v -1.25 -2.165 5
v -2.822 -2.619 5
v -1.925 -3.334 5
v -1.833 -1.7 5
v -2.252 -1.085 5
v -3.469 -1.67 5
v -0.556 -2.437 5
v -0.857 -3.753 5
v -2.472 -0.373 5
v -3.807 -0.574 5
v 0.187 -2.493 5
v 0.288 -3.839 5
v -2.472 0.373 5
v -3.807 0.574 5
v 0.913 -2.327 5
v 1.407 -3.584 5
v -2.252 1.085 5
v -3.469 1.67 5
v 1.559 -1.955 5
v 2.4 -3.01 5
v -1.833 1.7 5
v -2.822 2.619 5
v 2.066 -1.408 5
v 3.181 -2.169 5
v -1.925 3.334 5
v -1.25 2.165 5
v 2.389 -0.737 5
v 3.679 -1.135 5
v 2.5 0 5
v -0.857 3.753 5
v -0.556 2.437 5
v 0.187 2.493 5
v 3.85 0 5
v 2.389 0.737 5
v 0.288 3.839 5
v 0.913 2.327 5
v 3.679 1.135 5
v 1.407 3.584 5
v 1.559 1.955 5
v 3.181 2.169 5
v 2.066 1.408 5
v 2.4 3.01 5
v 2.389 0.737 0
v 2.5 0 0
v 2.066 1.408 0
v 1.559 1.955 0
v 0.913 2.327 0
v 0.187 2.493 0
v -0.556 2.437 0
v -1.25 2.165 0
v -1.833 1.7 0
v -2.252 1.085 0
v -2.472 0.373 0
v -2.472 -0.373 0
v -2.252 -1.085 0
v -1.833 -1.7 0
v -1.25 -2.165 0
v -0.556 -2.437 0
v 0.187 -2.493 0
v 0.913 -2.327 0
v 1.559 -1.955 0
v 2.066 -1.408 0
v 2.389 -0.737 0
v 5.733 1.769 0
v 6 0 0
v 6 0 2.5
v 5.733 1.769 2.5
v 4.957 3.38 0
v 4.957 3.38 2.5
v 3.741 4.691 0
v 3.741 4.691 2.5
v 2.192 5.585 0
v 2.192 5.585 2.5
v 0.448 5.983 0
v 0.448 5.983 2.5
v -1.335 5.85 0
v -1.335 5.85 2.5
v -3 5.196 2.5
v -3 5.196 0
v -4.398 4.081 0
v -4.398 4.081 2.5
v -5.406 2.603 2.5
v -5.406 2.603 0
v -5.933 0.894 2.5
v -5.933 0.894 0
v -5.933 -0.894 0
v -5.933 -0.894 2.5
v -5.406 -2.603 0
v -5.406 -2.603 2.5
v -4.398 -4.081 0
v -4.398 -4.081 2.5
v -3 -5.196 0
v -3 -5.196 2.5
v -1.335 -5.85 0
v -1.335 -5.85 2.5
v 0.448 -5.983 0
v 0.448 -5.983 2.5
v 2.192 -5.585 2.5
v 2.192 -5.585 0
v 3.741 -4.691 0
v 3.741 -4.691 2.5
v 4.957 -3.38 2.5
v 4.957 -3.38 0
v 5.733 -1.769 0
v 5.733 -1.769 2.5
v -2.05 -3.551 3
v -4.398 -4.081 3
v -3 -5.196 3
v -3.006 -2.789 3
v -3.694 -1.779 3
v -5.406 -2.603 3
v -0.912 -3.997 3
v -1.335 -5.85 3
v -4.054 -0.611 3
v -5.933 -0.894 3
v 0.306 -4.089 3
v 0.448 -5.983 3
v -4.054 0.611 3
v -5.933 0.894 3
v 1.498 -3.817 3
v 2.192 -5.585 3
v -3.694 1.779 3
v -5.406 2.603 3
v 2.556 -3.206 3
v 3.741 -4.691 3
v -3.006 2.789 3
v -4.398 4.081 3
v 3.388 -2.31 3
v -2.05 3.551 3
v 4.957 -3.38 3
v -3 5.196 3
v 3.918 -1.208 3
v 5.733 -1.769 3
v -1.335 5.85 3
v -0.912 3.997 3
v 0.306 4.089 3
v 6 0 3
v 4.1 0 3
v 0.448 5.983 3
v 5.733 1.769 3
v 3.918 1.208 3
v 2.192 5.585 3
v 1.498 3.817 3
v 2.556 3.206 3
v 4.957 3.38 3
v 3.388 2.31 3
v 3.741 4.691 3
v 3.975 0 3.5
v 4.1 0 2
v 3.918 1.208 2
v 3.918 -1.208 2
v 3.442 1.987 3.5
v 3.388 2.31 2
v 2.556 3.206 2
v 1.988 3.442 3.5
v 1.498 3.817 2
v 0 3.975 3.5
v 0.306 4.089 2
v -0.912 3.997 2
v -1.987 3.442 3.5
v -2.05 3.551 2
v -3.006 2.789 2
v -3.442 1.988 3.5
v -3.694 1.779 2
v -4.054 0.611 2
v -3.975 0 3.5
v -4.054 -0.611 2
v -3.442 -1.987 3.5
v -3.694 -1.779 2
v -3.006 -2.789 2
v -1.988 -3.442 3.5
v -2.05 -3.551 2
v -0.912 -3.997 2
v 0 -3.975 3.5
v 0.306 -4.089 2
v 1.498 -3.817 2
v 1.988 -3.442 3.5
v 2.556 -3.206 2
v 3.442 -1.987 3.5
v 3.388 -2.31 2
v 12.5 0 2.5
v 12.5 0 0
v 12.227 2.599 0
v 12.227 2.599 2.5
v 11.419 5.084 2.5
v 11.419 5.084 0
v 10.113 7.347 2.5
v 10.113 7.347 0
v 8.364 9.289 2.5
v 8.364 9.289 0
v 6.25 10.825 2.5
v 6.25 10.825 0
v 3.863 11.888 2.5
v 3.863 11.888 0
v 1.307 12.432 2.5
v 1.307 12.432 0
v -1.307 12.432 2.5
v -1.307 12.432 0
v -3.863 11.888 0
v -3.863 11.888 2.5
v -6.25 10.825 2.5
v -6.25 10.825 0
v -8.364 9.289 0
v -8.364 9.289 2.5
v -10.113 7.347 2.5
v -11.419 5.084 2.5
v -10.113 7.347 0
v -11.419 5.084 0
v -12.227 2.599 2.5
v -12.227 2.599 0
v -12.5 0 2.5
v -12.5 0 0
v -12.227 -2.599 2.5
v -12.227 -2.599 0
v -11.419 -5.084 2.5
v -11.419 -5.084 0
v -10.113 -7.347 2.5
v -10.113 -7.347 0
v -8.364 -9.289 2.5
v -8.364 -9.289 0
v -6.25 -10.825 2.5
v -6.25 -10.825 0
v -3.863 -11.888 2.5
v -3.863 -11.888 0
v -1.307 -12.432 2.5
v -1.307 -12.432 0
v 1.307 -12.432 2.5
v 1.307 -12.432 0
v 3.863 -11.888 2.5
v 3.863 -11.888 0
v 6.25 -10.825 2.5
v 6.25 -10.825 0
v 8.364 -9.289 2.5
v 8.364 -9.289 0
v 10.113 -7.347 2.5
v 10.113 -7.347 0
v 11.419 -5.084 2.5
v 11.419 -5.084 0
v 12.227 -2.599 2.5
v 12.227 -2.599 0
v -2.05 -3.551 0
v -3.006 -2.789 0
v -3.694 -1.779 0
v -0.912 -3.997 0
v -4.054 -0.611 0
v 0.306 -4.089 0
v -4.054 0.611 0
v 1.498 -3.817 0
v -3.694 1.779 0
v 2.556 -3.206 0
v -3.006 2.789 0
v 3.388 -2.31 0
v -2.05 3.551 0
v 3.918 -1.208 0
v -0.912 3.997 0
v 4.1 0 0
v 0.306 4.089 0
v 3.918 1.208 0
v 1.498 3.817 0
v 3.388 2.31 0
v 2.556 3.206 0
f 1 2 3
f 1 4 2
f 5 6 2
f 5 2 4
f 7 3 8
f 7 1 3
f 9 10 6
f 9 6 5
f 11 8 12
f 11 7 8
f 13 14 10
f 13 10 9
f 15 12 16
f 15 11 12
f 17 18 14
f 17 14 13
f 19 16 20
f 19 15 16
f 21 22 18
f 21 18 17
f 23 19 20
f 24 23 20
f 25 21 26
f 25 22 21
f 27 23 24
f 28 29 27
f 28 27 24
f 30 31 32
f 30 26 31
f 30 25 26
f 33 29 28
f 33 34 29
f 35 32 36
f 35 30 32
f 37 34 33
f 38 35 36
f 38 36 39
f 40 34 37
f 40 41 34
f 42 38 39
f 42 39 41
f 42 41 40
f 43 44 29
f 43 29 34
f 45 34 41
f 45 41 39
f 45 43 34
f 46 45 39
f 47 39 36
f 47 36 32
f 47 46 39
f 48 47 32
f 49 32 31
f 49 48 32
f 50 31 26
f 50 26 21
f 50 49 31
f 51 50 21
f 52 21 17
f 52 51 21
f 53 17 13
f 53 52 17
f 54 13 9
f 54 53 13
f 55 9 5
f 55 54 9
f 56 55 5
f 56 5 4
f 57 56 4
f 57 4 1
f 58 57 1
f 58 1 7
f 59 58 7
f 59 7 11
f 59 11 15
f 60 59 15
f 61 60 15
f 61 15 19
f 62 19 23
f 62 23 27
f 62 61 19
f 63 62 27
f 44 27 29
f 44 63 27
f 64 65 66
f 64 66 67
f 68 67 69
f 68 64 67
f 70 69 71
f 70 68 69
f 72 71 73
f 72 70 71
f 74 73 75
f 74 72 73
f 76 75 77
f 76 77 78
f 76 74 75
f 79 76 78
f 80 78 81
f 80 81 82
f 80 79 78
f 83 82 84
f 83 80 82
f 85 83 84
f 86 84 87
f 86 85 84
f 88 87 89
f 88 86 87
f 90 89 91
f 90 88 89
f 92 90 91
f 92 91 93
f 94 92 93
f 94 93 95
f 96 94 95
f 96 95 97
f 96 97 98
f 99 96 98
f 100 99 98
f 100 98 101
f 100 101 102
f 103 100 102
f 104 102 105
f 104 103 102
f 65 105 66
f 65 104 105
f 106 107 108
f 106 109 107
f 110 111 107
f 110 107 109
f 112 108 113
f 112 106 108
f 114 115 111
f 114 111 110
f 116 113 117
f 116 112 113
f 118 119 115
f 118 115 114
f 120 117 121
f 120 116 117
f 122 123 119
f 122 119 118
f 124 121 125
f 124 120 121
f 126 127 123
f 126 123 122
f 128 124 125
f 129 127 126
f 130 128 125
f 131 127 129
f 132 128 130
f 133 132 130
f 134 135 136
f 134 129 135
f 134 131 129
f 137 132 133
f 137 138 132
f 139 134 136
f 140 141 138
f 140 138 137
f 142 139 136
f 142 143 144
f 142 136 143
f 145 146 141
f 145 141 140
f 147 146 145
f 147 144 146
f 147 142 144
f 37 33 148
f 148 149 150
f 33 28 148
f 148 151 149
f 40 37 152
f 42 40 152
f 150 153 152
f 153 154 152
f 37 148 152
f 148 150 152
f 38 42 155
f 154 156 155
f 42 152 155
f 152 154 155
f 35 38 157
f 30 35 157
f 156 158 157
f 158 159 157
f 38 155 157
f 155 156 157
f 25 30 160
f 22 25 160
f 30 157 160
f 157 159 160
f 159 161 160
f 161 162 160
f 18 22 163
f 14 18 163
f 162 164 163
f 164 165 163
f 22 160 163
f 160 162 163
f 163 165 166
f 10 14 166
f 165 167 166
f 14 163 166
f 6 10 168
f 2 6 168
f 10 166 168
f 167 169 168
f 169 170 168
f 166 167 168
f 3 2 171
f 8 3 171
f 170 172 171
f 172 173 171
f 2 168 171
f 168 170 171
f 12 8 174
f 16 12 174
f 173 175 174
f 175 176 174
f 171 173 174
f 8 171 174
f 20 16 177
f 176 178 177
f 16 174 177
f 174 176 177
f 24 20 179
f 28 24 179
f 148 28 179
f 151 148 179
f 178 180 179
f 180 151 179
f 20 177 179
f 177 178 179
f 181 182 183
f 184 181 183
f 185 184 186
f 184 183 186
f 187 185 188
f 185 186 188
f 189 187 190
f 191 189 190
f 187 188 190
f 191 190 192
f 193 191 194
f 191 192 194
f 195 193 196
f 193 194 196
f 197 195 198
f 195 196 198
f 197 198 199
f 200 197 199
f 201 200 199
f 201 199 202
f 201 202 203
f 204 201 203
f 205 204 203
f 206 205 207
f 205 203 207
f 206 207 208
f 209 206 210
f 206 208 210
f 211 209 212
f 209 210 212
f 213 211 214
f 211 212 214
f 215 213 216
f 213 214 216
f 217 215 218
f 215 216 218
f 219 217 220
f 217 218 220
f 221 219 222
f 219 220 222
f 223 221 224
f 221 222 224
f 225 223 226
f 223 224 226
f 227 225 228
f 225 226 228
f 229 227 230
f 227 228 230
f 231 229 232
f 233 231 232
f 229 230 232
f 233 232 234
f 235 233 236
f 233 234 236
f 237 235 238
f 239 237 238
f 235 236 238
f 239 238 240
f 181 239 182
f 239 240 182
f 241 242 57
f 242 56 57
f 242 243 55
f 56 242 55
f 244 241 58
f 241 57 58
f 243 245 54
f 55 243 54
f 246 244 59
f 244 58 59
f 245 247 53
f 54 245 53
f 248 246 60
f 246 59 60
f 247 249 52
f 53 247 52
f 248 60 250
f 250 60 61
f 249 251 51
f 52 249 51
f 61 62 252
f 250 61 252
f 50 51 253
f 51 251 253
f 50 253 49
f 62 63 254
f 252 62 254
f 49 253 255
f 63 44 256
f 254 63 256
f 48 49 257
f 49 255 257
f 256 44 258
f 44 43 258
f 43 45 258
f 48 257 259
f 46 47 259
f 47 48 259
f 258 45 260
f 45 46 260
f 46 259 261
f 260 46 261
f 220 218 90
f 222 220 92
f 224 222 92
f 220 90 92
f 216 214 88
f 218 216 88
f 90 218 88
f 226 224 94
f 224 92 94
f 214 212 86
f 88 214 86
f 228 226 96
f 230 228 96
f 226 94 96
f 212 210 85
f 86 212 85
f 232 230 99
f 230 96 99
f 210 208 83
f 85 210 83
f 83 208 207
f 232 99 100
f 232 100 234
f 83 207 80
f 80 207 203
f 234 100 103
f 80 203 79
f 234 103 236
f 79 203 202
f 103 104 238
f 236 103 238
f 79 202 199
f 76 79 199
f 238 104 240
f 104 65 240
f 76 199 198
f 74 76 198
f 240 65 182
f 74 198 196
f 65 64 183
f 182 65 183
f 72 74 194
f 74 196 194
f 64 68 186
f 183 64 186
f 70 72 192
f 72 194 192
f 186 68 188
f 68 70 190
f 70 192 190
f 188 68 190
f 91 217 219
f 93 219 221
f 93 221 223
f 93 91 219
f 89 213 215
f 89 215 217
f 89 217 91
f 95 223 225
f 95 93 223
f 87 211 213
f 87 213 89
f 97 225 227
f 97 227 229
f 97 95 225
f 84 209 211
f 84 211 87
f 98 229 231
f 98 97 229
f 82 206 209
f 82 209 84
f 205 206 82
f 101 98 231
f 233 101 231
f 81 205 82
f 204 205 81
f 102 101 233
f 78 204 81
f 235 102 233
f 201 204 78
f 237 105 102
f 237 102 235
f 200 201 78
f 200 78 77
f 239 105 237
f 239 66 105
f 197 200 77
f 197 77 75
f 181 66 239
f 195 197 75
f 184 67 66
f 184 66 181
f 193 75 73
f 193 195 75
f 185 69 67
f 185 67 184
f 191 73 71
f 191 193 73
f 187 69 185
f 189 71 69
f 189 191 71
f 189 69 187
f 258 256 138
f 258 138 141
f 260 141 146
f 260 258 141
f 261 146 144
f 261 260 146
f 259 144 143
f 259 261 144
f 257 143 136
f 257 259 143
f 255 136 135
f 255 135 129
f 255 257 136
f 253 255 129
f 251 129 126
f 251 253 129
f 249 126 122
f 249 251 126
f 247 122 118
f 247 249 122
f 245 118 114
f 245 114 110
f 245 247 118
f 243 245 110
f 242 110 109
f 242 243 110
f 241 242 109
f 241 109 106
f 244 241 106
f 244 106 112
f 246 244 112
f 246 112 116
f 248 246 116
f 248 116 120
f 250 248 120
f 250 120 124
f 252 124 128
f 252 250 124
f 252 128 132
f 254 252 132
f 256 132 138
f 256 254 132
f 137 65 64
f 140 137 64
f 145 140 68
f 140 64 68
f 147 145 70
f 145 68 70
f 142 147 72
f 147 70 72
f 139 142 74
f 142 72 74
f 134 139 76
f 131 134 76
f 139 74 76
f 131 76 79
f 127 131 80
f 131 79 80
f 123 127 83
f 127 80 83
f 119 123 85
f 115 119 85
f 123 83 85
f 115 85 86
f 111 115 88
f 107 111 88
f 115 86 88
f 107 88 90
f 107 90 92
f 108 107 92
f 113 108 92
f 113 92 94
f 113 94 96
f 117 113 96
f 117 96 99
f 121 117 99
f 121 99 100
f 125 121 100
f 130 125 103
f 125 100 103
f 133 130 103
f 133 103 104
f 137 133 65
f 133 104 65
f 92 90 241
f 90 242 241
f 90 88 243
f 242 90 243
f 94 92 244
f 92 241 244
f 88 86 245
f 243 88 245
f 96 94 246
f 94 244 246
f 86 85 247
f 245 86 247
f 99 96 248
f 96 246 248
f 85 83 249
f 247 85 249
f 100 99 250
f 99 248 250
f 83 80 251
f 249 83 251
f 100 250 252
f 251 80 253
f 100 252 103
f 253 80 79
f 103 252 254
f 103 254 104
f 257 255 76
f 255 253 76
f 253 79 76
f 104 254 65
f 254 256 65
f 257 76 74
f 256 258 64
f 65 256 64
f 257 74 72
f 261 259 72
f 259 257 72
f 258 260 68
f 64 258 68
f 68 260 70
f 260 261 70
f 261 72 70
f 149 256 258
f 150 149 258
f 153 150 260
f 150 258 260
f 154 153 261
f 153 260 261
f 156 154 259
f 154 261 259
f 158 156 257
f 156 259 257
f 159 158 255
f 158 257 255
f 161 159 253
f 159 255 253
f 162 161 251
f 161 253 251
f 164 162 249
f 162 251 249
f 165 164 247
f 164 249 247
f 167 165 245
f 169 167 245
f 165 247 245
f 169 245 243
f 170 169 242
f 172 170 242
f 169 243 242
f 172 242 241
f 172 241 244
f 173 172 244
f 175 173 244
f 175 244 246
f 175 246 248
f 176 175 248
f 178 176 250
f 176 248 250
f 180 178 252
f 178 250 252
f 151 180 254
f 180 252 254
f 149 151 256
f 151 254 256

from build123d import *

# Parameters (mm, degrees)
F0_R     = 4.1
F0_R_2   = 2.5
F1_DEPTH = 5
F0_R_3   = 12.5
F0_R_4   = 6
F2_DEPTH = 2.5
F3_DEPTH = 3
F4_SIZE2 = 3
F4_SIZE  = 0.25


with BuildPart() as f1:
    # F0 (on Top) → F1 (new body)
    with BuildSketch(Plane.XY):
        Circle(F0_R)
        Circle(F0_R_2, mode=Mode.SUBTRACT)
    extrude(amount=F1_DEPTH)

    # F4
    f4_edges = [f1.edges().sort_by_distance(p)[0] for p in [
        (-4.1, 0, 5),
    ]]
    f4_side = f1.faces().sort_by_distance((-3.984034, 0, 5))[0]
    chamfer(f4_edges, length=F4_SIZE, length2=F4_SIZE2, reference=f4_side)


with BuildPart() as f2:
    # F0 (on Top) → F2 (new body)
    with BuildSketch(Plane.XY):
        Circle(F0_R_3)
        Circle(F0_R_4, mode=Mode.SUBTRACT)
    extrude(amount=F2_DEPTH)


with BuildPart() as f3:
    # F0 (on Top) → F3 (new body)
    with BuildSketch(Plane.XY):
        Circle(F0_R_4)
        Circle(F0_R, mode=Mode.SUBTRACT)
    extrude(amount=F3_DEPTH)


solid = Compound([f1.part, f2.part, f3.part])
